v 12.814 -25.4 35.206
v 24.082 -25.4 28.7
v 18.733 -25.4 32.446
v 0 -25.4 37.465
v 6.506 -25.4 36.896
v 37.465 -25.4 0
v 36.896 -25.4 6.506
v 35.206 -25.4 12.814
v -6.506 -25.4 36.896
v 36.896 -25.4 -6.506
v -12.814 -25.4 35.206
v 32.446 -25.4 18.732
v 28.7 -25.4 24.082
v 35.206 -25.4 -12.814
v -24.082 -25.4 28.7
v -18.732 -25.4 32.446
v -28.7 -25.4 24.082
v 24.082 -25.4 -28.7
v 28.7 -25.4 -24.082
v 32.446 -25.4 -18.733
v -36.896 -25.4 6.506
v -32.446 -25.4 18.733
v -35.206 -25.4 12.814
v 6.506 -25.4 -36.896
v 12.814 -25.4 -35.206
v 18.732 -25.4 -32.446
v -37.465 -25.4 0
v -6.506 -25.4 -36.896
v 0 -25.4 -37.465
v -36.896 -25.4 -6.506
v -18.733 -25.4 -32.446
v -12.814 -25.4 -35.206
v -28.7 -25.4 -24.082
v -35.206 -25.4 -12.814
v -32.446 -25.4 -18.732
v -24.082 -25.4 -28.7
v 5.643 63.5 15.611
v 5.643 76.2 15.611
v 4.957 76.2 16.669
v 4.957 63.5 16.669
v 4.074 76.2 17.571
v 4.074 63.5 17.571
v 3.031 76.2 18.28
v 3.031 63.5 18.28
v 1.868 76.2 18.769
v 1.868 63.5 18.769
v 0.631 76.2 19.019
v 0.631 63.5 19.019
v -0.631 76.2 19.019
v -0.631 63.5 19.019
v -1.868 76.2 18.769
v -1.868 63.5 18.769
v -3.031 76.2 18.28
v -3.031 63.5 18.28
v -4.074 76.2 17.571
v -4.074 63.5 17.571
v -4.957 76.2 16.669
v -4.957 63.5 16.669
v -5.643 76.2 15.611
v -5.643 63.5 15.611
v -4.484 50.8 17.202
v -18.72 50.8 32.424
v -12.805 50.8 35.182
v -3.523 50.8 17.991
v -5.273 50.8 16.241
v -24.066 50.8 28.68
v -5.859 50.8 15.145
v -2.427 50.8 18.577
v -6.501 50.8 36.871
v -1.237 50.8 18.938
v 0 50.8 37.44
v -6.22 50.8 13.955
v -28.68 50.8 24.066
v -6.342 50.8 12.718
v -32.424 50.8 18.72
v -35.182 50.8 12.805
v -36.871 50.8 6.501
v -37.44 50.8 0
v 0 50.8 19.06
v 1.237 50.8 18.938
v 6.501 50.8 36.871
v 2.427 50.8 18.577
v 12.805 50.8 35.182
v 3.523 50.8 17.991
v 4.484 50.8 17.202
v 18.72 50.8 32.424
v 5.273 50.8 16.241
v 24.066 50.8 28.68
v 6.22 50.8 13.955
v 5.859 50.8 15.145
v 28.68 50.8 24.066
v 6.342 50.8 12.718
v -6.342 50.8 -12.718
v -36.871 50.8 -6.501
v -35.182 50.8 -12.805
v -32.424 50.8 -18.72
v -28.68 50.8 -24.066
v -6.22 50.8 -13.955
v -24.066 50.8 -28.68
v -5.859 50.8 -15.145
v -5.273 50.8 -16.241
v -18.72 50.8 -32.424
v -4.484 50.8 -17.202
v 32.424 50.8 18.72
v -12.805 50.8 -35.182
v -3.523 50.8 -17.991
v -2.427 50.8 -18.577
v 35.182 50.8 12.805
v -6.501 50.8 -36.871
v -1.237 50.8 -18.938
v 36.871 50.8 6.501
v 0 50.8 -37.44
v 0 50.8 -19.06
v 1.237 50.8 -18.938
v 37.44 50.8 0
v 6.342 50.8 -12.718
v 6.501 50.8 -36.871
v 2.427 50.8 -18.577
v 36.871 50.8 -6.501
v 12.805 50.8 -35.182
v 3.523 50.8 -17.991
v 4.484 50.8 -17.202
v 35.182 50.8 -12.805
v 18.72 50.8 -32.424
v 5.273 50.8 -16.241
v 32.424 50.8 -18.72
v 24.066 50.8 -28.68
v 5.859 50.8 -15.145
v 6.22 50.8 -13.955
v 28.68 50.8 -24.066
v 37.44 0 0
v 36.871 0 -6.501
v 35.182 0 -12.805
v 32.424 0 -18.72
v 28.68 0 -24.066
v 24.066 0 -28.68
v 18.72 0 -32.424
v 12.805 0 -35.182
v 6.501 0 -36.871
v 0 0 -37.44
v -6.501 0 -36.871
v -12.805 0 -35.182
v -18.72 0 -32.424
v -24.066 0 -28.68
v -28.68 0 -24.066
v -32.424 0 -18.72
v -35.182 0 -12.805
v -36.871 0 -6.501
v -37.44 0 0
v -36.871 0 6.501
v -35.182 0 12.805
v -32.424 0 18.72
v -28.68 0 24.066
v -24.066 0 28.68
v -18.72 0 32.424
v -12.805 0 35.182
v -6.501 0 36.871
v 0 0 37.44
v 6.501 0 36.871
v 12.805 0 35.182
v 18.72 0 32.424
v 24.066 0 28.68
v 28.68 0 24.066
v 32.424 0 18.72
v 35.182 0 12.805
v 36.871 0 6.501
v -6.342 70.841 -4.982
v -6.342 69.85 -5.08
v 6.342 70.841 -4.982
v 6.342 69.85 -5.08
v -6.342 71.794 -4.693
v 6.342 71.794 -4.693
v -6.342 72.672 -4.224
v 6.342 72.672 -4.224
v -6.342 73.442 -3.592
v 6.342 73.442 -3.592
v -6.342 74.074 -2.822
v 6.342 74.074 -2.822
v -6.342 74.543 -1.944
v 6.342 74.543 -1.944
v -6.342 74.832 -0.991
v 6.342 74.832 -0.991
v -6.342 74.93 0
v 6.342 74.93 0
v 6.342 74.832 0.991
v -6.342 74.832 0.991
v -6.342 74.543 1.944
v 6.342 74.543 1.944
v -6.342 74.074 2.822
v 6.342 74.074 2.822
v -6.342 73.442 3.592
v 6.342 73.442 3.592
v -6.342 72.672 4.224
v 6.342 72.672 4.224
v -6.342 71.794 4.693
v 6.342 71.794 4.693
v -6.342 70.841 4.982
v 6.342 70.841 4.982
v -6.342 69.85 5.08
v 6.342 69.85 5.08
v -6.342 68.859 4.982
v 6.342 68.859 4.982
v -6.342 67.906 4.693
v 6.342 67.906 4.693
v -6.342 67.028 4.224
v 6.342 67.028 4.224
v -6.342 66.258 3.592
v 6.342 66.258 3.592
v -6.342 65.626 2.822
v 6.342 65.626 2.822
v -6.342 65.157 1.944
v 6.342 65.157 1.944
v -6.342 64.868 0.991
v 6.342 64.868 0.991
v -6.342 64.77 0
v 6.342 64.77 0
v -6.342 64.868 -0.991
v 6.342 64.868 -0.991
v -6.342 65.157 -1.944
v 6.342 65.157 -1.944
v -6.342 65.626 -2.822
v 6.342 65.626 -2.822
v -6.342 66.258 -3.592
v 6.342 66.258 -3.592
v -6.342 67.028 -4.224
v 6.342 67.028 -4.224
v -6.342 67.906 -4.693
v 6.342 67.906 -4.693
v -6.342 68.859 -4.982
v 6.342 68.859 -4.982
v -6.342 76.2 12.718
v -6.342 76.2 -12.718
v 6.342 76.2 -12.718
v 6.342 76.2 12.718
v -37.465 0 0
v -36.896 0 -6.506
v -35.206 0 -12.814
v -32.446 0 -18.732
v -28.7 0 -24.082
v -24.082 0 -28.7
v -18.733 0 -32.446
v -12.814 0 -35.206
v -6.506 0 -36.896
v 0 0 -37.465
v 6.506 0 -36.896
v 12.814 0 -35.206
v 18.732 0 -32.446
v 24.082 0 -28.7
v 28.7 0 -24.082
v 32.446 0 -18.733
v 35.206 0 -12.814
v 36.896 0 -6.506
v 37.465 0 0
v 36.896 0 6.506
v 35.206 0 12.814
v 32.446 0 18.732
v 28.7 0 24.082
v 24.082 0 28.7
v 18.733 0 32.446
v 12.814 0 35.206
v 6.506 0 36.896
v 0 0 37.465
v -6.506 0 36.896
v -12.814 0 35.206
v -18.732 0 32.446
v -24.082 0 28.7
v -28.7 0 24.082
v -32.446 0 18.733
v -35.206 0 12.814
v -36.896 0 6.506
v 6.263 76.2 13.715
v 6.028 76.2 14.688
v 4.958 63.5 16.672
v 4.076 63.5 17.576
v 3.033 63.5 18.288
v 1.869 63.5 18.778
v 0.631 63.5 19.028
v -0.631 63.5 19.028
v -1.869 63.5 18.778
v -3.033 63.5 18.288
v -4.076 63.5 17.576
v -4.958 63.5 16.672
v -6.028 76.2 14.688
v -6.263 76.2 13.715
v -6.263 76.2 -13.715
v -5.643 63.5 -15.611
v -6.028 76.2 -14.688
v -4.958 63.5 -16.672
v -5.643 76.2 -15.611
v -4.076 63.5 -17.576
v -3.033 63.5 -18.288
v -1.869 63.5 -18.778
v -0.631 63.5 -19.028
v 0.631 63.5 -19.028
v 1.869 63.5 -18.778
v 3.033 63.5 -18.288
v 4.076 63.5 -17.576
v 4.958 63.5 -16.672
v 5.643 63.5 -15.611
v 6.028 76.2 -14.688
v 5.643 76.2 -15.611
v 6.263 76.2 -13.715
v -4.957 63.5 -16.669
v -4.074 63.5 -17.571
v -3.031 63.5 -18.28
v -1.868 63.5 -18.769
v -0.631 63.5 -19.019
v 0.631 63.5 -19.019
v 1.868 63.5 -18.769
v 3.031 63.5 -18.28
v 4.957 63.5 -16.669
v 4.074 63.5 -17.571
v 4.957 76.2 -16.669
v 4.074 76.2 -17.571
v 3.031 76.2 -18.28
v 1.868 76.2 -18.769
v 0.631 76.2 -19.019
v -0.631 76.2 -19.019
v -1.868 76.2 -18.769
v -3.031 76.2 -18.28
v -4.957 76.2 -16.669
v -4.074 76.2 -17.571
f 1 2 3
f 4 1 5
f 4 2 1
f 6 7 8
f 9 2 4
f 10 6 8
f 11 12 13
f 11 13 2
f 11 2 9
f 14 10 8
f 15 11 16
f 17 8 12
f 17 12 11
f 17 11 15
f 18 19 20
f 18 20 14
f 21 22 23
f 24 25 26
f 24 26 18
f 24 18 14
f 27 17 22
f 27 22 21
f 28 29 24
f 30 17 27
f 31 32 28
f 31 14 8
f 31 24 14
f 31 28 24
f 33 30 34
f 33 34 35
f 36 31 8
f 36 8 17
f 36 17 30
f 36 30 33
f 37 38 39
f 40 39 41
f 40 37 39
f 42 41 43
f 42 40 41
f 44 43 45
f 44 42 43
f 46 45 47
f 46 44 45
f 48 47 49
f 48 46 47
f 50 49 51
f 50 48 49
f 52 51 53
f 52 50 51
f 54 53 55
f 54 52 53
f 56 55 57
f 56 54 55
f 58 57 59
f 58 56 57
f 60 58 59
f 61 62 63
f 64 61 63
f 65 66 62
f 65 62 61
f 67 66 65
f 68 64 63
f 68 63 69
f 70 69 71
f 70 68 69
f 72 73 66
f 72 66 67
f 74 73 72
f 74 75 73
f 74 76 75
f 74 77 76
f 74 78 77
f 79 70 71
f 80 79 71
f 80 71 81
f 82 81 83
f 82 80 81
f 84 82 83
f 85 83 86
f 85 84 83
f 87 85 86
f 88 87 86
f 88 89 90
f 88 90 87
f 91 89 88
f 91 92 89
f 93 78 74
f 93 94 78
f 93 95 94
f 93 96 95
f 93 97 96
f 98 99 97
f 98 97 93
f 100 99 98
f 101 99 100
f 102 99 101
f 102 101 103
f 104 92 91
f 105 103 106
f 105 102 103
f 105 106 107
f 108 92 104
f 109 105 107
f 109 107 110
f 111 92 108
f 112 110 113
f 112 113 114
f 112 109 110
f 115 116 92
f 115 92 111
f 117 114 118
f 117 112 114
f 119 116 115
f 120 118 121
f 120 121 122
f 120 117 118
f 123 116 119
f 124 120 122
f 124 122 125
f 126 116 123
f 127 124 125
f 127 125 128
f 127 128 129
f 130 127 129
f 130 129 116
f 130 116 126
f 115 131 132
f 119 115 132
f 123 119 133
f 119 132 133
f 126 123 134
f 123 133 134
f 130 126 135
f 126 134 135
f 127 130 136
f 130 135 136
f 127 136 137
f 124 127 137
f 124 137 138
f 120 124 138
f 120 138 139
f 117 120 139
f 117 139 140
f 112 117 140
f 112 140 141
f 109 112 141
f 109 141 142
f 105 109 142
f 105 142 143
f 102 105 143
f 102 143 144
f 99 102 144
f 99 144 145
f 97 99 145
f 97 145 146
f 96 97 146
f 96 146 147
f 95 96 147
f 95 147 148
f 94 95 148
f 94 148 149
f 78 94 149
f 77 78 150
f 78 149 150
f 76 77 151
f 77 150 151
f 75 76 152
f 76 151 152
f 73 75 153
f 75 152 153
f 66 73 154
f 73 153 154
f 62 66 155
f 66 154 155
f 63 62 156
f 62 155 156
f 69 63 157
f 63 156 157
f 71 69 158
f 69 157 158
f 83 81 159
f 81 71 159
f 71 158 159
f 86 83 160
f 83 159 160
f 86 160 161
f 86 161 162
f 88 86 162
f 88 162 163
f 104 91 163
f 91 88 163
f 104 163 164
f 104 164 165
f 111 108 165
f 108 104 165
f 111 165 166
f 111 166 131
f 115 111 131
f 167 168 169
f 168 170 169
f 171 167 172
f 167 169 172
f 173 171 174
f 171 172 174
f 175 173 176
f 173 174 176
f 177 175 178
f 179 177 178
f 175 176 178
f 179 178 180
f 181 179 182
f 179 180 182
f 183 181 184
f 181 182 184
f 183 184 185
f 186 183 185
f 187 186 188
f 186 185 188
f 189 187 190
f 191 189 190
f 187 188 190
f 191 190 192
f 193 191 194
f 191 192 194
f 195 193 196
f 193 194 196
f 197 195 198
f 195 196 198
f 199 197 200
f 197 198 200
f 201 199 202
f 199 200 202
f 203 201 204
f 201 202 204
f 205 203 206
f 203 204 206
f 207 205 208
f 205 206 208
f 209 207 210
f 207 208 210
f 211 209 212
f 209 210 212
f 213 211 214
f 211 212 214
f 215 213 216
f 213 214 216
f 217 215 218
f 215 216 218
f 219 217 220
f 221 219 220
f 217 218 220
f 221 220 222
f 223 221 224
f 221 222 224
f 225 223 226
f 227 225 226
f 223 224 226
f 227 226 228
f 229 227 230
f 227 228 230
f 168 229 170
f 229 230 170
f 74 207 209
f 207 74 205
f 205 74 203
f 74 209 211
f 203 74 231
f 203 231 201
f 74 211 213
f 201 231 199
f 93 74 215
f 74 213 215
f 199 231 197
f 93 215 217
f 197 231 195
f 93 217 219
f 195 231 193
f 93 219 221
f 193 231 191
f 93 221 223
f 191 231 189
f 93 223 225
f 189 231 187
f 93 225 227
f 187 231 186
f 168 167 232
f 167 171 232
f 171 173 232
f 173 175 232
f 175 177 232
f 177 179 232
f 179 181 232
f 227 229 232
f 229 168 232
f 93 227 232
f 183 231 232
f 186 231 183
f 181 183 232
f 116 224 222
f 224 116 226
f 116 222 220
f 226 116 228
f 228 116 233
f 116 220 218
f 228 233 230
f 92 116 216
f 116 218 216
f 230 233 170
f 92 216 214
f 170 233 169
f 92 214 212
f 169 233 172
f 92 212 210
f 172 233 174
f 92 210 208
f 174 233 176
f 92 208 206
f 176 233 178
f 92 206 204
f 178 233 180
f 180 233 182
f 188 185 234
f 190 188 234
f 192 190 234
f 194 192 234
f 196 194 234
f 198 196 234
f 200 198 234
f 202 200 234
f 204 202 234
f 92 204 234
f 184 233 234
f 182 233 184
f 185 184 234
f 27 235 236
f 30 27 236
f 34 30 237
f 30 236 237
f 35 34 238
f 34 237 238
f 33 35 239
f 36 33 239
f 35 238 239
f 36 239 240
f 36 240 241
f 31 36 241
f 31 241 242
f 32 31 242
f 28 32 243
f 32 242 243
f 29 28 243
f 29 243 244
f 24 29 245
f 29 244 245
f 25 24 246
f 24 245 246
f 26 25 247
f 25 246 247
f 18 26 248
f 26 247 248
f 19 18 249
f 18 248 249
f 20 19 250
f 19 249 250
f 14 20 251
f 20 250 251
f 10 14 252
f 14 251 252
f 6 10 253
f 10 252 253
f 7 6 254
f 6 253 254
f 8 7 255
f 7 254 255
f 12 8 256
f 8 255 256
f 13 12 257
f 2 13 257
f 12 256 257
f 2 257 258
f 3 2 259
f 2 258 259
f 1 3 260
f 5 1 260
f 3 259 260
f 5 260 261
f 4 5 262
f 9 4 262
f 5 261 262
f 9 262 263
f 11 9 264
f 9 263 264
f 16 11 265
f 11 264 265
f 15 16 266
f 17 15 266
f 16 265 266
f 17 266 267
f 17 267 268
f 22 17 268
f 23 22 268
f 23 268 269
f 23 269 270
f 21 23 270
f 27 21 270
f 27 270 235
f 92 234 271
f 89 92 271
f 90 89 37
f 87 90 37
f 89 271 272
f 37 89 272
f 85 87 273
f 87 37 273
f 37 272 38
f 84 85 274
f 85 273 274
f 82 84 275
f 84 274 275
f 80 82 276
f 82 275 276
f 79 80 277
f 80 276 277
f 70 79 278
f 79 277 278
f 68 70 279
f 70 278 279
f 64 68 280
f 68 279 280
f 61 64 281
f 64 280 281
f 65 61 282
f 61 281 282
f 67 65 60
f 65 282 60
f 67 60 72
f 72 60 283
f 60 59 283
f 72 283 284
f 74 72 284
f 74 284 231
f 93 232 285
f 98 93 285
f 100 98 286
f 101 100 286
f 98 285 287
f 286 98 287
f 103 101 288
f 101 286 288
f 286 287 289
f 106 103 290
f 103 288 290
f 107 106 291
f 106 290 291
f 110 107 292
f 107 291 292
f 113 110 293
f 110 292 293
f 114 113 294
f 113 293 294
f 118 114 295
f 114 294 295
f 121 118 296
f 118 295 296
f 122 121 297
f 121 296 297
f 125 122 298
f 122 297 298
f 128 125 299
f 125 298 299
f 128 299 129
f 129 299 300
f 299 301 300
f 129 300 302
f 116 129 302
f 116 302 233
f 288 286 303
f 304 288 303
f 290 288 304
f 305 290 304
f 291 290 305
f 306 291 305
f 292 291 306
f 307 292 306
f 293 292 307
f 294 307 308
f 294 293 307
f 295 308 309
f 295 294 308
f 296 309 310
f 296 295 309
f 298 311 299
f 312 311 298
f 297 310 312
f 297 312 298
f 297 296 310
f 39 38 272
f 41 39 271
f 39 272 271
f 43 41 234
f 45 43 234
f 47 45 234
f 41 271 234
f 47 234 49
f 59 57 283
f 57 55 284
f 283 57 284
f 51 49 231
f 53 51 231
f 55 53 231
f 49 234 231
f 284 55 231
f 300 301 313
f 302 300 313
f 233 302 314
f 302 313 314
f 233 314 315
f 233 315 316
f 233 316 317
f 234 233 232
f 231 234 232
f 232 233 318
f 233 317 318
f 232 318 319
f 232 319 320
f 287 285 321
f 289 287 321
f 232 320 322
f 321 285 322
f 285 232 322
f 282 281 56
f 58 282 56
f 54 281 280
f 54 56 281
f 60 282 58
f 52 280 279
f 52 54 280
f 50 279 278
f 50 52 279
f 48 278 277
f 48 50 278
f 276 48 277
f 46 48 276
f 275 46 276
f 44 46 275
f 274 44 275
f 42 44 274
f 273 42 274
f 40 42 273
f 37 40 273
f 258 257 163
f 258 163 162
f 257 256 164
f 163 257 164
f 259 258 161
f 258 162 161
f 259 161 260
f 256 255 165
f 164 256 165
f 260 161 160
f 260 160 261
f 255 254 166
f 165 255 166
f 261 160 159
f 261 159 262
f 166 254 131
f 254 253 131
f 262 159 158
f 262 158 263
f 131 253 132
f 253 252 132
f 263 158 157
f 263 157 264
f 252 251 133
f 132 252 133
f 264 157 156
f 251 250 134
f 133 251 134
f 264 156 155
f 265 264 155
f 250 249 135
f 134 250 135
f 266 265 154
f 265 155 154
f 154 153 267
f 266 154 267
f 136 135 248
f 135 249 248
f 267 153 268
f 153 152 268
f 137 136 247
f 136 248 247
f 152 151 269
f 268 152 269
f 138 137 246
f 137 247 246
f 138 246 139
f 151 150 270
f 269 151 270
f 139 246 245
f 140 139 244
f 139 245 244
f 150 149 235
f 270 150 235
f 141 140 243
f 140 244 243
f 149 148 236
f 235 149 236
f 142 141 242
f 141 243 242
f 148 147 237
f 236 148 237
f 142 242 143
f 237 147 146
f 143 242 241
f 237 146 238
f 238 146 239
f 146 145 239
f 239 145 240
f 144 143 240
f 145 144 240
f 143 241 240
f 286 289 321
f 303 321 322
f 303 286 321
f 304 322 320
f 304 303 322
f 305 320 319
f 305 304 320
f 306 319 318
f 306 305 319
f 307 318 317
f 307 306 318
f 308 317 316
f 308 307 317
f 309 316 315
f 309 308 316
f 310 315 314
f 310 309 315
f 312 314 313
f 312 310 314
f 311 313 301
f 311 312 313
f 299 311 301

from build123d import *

# Parameters (mm, degrees)
SKETCH1_R               = 38.1
BOSS_EXTRUDE1_DEPTH     = 63.5
BOSS_EXTRUDE2_DEPTH     = 76.2
SKETCH3_R               = 5.08
CUT_EXTRUDE1_DEPTH      = 76.2
CUT_EXTRUDE1_DEPTH_BACK = 76.2
SKETCH4_R               = 50.8
SKETCH4_R_2             = 37.439644023
CUT_EXTRUDE4_DEPTH      = 76.2
CUT_EXTRUDE4_DEPTH_BACK = 76.2
SKETCH5_R               = 38.1
CUT_EXTRUDE8_DEPTH      = 25.4
SKETCH6_R               = 37.465
BOSS_EXTRUDE4_DEPTH     = 25.4


with BuildPart() as part:
    # Sketch1 → Boss-Extrude1 (new body)
    with BuildSketch(Plane(origin=(0, 0, 0), x_dir=(1, 0, 0), z_dir=(0, 1, 0))):
        Circle(SKETCH1_R)
    extrude(amount=BOSS_EXTRUDE1_DEPTH)

    # Sketch2 → Boss-Extrude2 (add)
    with BuildSketch(Plane(origin=(0, 0, 0), x_dir=(1, 0, 0), z_dir=(0, 1, 0))):
        with BuildLine():
            Line((-6.35, -12.7), (-6.35, 12.7))
            ThreePointArc((-6.35, 12.7), (0, 19.05), (6.35, 12.7))
            Line((6.35, 12.7), (6.35, -12.7))
            ThreePointArc((6.35, -12.7), (0, -19.05), (-6.35, -12.7))
        make_face()
    extrude(amount=BOSS_EXTRUDE2_DEPTH)

    # Sketch3 → Cut-Extrude1 (cut, two sides)
    with BuildSketch(Plane(origin=(0, 0, 0), x_dir=(0, 0, -1), z_dir=(1, 0, 0))) as cut_extrude1_sk:
        with Locations((0, 69.85)):
            Circle(SKETCH3_R)
    extrude(amount=CUT_EXTRUDE1_DEPTH, mode=Mode.SUBTRACT)
    extrude(cut_extrude1_sk.sketch, amount=-CUT_EXTRUDE1_DEPTH_BACK, mode=Mode.SUBTRACT)

    # Sketch4 → Cut-Extrude4 (cut, two sides)
    with BuildSketch(Plane(origin=(0, 0, 0), x_dir=(1, 0, 0), z_dir=(0, 1, 0))) as cut_extrude4_sk:
        Circle(SKETCH4_R)
        Circle(SKETCH4_R_2, mode=Mode.SUBTRACT)
    extrude(amount=CUT_EXTRUDE4_DEPTH, mode=Mode.SUBTRACT)
    extrude(cut_extrude4_sk.sketch, amount=-CUT_EXTRUDE4_DEPTH_BACK, mode=Mode.SUBTRACT)

    # Sketch5 → Cut-Extrude8 (cut)
    with BuildSketch(Plane(origin=(0, 76.2, 0), x_dir=(1, 0, 0), z_dir=(0, 1, 0))):
        Circle(SKETCH5_R)
        with BuildLine():
            Line((-6.341677417, -12.718199215), (-6.341677417, 12.718199215))
            ThreePointArc((-6.341677417, 12.718199215), (0, 19.059876632), (6.341677417, 12.718199215))
            Line((6.341677417, 12.718199215), (6.341677417, -12.718199215))
            ThreePointArc((6.341677417, -12.718199215), (0, -19.059876632), (-6.341677417, -12.718199215))
        make_face(mode=Mode.SUBTRACT)
    extrude(amount=-CUT_EXTRUDE8_DEPTH, mode=Mode.SUBTRACT)

    # Sketch6 → Boss-Extrude4 (add)
    with BuildSketch(Plane(origin=(0, 0, 0), x_dir=(-1, 0, 0), z_dir=(0, -1, 0))):
        Circle(SKETCH6_R)
    extrude(amount=BOSS_EXTRUDE4_DEPTH)


solid = part.part
